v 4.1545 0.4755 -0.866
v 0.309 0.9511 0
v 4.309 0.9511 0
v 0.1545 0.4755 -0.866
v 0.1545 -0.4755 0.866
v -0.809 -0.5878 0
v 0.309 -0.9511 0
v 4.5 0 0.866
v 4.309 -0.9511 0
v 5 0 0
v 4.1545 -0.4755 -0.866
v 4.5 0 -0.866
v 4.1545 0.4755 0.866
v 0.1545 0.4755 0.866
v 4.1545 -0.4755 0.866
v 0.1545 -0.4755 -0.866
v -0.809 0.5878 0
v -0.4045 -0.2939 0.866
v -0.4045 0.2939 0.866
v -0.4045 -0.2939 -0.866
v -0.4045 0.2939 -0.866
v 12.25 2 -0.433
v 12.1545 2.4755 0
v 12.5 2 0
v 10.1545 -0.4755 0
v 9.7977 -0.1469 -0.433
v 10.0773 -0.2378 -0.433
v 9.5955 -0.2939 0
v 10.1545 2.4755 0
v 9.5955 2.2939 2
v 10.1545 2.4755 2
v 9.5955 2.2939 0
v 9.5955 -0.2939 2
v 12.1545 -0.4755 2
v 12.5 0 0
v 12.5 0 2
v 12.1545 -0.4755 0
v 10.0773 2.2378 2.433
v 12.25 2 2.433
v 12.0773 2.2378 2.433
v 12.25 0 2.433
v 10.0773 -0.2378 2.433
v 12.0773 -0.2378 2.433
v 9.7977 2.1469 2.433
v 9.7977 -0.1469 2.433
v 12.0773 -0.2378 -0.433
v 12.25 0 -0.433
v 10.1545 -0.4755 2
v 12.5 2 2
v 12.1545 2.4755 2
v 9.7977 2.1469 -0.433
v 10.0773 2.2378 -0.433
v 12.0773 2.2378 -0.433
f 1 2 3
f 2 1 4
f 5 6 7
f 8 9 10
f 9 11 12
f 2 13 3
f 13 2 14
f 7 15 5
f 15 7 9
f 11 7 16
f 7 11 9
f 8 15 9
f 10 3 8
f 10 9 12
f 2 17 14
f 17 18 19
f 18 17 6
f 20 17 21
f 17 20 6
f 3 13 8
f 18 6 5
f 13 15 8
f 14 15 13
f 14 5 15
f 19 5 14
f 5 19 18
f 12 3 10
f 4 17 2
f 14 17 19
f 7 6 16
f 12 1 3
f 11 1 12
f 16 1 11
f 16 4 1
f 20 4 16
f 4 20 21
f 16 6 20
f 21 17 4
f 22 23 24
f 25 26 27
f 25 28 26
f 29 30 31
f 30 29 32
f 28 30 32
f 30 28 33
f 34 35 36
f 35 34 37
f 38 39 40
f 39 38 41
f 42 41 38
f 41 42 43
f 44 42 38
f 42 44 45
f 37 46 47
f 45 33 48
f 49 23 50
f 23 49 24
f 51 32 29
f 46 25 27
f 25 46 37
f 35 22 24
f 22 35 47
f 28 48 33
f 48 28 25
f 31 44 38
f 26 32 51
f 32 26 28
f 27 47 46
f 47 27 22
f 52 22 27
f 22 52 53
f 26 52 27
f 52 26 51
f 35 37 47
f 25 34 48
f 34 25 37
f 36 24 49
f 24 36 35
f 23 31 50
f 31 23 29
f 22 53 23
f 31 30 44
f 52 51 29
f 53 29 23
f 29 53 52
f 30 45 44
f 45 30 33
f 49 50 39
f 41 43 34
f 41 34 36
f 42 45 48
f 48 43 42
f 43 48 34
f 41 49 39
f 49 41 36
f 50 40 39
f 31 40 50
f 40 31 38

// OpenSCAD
union() {
  hull() {
    translate([0, 0, 0]) sphere(r=1);
    translate([4, 0, 0]) sphere(r=1);
  }
  minkowski() {
    translate([10, 0, 0]) cube([2, 2, 2]);
    sphere(r=0.5);
  }
}
